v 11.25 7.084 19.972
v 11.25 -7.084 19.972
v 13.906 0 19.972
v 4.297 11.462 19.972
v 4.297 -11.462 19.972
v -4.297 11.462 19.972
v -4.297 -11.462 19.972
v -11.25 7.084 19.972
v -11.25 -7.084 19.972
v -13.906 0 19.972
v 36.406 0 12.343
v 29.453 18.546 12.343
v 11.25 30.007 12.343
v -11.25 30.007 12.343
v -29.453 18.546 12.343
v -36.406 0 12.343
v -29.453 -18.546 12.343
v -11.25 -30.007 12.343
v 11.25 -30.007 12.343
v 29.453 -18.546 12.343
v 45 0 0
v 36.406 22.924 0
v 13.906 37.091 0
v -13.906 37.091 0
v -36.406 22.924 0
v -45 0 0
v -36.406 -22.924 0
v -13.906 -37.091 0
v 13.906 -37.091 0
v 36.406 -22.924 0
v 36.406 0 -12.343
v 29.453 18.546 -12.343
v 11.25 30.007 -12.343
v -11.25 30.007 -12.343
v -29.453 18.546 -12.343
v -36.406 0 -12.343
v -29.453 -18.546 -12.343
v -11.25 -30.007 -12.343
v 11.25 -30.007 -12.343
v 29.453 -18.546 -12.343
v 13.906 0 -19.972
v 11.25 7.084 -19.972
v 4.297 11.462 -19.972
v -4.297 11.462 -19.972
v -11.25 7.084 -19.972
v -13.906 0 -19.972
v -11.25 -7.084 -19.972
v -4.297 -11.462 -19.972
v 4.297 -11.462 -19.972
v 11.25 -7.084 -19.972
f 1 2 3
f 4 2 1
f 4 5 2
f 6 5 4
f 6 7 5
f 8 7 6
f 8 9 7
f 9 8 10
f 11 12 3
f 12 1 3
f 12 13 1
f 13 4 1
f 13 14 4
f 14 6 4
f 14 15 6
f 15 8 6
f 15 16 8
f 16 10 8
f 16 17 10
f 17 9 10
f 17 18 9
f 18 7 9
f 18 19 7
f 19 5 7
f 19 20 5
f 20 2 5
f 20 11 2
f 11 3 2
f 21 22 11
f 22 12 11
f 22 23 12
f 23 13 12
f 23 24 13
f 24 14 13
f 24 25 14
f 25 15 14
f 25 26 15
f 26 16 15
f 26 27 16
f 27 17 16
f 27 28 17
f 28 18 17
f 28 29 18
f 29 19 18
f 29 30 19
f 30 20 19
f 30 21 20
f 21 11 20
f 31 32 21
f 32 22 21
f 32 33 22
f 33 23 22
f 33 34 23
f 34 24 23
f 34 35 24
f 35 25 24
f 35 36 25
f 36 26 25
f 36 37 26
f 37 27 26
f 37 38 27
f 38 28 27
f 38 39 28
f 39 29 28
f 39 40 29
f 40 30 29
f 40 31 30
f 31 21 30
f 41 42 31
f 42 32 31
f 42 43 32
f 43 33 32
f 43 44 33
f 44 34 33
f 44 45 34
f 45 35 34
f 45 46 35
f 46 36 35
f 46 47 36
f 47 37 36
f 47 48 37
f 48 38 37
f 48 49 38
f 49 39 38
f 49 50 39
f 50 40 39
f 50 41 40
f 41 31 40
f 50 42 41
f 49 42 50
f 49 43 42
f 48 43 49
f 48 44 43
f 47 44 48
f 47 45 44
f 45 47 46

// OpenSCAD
// Generated by SolidPython 1.0.1 on 2020-07-29 00:46:52


scale(v = [15, 13, 7]) {
	sphere(r = 3);
}
/***********************************************
*********      SolidPython code:      **********
************************************************
 
# import packages: SolidPython
from solid import *
from solid.utils import *
from itertools import chain, combinations, permutations


class Resize:

    def __init__(self, scad_file):
        self.scad_file = scad_file
        #self.scad_file = import_scad(scad_file)
        # cone/cylinder param:
        self.r1 = 0
        self.r2 = 0
        self.h = 0
        # rectangular prism param:
        self.w = 0
        self.l = 0
        # ellipse param:
        self.r = 0

    # import OpenScad code (file name corresponds to shape)


    # classify shape + parameters
    def assign(self, param1, param2, param3):
        if self.scad_file == 'cone.scad':
            self.r1 = param1
            self.r2 = param2
            self.h = param3
        elif self.scad_file == 'cylinder.scad':
            self.r1 = param1
            self.r2 = param2
            self.h = param3
        elif self.scad_file == 'rectangularPrism.scad':
            self.h = param1
            self.l = param2
            self.w = param3
        else:
            self.r = param1
            self.h = param2

    # resize parameters
    def iterate(self):
        x = range(3, 20, 2)
        i = 1
        if self.scad_file == 'cone.scad':
            tempList = list(permutations(x, 2))
            for temp in tempList:
                param1 = temp[0]
                param2 = temp[1]
                filepath = 'produced_scad_files/' + 'cone' + str(param1) + '_' + str(param2) + '_' + '.scad'
                scad_render_to_file(cylinder(h=param1, r1=param2, r2=0), filepath)

        elif self.scad_file == 'cylinder.scad':
            tempList = list(permutations(x, 3))
            for temp in tempList:
                param1 = temp[0]
                param2 = temp[1]
                filepath = 'produced_scad_files/' + 'cylinder' + str(param1) + '_' + str(param2) + '_' + '.scad'
                scad_render_to_file(cylinder(h=param1, r1=param2, r2=param2), filepath)

        elif self.scad_file == 'rectangularPrism.scad':
            tempList = list(permutations(x, 3))
            for temp in tempList:
                param1 = temp[0]
                param2 = temp[1]
                param3 = temp[2]
                filepath = 'produced_scad_files/' + 'rectangularPrism' + str(param1) + '_' + str(param2) + '_' + str(
                    param3) + '.scad'
                scad_render_to_file(cube(size=(param1, param2, param3)), filepath)

        elif self.scad_file == 'ellipse.scad':
            tempList = list(permutations(x, 4))
            for temp in tempList:
                param1 = temp[0]
                param2 = temp[1]
                param3 = temp[2]
                param4 = temp[3]
                filepath = 'produced_scad_files/' + 'ellipse' + str(param1) + '_' + str(param2) + '_' + str(param3) + '_' + str(param4) + '.scad'
                scad_render_to_file(scale([param1, param2, param3])(sphere(r=param4)), filepath)

    def render_to_scadfile(self):
        scad_render_to_file(scad, 'example.scad') 
 
************************************************/
